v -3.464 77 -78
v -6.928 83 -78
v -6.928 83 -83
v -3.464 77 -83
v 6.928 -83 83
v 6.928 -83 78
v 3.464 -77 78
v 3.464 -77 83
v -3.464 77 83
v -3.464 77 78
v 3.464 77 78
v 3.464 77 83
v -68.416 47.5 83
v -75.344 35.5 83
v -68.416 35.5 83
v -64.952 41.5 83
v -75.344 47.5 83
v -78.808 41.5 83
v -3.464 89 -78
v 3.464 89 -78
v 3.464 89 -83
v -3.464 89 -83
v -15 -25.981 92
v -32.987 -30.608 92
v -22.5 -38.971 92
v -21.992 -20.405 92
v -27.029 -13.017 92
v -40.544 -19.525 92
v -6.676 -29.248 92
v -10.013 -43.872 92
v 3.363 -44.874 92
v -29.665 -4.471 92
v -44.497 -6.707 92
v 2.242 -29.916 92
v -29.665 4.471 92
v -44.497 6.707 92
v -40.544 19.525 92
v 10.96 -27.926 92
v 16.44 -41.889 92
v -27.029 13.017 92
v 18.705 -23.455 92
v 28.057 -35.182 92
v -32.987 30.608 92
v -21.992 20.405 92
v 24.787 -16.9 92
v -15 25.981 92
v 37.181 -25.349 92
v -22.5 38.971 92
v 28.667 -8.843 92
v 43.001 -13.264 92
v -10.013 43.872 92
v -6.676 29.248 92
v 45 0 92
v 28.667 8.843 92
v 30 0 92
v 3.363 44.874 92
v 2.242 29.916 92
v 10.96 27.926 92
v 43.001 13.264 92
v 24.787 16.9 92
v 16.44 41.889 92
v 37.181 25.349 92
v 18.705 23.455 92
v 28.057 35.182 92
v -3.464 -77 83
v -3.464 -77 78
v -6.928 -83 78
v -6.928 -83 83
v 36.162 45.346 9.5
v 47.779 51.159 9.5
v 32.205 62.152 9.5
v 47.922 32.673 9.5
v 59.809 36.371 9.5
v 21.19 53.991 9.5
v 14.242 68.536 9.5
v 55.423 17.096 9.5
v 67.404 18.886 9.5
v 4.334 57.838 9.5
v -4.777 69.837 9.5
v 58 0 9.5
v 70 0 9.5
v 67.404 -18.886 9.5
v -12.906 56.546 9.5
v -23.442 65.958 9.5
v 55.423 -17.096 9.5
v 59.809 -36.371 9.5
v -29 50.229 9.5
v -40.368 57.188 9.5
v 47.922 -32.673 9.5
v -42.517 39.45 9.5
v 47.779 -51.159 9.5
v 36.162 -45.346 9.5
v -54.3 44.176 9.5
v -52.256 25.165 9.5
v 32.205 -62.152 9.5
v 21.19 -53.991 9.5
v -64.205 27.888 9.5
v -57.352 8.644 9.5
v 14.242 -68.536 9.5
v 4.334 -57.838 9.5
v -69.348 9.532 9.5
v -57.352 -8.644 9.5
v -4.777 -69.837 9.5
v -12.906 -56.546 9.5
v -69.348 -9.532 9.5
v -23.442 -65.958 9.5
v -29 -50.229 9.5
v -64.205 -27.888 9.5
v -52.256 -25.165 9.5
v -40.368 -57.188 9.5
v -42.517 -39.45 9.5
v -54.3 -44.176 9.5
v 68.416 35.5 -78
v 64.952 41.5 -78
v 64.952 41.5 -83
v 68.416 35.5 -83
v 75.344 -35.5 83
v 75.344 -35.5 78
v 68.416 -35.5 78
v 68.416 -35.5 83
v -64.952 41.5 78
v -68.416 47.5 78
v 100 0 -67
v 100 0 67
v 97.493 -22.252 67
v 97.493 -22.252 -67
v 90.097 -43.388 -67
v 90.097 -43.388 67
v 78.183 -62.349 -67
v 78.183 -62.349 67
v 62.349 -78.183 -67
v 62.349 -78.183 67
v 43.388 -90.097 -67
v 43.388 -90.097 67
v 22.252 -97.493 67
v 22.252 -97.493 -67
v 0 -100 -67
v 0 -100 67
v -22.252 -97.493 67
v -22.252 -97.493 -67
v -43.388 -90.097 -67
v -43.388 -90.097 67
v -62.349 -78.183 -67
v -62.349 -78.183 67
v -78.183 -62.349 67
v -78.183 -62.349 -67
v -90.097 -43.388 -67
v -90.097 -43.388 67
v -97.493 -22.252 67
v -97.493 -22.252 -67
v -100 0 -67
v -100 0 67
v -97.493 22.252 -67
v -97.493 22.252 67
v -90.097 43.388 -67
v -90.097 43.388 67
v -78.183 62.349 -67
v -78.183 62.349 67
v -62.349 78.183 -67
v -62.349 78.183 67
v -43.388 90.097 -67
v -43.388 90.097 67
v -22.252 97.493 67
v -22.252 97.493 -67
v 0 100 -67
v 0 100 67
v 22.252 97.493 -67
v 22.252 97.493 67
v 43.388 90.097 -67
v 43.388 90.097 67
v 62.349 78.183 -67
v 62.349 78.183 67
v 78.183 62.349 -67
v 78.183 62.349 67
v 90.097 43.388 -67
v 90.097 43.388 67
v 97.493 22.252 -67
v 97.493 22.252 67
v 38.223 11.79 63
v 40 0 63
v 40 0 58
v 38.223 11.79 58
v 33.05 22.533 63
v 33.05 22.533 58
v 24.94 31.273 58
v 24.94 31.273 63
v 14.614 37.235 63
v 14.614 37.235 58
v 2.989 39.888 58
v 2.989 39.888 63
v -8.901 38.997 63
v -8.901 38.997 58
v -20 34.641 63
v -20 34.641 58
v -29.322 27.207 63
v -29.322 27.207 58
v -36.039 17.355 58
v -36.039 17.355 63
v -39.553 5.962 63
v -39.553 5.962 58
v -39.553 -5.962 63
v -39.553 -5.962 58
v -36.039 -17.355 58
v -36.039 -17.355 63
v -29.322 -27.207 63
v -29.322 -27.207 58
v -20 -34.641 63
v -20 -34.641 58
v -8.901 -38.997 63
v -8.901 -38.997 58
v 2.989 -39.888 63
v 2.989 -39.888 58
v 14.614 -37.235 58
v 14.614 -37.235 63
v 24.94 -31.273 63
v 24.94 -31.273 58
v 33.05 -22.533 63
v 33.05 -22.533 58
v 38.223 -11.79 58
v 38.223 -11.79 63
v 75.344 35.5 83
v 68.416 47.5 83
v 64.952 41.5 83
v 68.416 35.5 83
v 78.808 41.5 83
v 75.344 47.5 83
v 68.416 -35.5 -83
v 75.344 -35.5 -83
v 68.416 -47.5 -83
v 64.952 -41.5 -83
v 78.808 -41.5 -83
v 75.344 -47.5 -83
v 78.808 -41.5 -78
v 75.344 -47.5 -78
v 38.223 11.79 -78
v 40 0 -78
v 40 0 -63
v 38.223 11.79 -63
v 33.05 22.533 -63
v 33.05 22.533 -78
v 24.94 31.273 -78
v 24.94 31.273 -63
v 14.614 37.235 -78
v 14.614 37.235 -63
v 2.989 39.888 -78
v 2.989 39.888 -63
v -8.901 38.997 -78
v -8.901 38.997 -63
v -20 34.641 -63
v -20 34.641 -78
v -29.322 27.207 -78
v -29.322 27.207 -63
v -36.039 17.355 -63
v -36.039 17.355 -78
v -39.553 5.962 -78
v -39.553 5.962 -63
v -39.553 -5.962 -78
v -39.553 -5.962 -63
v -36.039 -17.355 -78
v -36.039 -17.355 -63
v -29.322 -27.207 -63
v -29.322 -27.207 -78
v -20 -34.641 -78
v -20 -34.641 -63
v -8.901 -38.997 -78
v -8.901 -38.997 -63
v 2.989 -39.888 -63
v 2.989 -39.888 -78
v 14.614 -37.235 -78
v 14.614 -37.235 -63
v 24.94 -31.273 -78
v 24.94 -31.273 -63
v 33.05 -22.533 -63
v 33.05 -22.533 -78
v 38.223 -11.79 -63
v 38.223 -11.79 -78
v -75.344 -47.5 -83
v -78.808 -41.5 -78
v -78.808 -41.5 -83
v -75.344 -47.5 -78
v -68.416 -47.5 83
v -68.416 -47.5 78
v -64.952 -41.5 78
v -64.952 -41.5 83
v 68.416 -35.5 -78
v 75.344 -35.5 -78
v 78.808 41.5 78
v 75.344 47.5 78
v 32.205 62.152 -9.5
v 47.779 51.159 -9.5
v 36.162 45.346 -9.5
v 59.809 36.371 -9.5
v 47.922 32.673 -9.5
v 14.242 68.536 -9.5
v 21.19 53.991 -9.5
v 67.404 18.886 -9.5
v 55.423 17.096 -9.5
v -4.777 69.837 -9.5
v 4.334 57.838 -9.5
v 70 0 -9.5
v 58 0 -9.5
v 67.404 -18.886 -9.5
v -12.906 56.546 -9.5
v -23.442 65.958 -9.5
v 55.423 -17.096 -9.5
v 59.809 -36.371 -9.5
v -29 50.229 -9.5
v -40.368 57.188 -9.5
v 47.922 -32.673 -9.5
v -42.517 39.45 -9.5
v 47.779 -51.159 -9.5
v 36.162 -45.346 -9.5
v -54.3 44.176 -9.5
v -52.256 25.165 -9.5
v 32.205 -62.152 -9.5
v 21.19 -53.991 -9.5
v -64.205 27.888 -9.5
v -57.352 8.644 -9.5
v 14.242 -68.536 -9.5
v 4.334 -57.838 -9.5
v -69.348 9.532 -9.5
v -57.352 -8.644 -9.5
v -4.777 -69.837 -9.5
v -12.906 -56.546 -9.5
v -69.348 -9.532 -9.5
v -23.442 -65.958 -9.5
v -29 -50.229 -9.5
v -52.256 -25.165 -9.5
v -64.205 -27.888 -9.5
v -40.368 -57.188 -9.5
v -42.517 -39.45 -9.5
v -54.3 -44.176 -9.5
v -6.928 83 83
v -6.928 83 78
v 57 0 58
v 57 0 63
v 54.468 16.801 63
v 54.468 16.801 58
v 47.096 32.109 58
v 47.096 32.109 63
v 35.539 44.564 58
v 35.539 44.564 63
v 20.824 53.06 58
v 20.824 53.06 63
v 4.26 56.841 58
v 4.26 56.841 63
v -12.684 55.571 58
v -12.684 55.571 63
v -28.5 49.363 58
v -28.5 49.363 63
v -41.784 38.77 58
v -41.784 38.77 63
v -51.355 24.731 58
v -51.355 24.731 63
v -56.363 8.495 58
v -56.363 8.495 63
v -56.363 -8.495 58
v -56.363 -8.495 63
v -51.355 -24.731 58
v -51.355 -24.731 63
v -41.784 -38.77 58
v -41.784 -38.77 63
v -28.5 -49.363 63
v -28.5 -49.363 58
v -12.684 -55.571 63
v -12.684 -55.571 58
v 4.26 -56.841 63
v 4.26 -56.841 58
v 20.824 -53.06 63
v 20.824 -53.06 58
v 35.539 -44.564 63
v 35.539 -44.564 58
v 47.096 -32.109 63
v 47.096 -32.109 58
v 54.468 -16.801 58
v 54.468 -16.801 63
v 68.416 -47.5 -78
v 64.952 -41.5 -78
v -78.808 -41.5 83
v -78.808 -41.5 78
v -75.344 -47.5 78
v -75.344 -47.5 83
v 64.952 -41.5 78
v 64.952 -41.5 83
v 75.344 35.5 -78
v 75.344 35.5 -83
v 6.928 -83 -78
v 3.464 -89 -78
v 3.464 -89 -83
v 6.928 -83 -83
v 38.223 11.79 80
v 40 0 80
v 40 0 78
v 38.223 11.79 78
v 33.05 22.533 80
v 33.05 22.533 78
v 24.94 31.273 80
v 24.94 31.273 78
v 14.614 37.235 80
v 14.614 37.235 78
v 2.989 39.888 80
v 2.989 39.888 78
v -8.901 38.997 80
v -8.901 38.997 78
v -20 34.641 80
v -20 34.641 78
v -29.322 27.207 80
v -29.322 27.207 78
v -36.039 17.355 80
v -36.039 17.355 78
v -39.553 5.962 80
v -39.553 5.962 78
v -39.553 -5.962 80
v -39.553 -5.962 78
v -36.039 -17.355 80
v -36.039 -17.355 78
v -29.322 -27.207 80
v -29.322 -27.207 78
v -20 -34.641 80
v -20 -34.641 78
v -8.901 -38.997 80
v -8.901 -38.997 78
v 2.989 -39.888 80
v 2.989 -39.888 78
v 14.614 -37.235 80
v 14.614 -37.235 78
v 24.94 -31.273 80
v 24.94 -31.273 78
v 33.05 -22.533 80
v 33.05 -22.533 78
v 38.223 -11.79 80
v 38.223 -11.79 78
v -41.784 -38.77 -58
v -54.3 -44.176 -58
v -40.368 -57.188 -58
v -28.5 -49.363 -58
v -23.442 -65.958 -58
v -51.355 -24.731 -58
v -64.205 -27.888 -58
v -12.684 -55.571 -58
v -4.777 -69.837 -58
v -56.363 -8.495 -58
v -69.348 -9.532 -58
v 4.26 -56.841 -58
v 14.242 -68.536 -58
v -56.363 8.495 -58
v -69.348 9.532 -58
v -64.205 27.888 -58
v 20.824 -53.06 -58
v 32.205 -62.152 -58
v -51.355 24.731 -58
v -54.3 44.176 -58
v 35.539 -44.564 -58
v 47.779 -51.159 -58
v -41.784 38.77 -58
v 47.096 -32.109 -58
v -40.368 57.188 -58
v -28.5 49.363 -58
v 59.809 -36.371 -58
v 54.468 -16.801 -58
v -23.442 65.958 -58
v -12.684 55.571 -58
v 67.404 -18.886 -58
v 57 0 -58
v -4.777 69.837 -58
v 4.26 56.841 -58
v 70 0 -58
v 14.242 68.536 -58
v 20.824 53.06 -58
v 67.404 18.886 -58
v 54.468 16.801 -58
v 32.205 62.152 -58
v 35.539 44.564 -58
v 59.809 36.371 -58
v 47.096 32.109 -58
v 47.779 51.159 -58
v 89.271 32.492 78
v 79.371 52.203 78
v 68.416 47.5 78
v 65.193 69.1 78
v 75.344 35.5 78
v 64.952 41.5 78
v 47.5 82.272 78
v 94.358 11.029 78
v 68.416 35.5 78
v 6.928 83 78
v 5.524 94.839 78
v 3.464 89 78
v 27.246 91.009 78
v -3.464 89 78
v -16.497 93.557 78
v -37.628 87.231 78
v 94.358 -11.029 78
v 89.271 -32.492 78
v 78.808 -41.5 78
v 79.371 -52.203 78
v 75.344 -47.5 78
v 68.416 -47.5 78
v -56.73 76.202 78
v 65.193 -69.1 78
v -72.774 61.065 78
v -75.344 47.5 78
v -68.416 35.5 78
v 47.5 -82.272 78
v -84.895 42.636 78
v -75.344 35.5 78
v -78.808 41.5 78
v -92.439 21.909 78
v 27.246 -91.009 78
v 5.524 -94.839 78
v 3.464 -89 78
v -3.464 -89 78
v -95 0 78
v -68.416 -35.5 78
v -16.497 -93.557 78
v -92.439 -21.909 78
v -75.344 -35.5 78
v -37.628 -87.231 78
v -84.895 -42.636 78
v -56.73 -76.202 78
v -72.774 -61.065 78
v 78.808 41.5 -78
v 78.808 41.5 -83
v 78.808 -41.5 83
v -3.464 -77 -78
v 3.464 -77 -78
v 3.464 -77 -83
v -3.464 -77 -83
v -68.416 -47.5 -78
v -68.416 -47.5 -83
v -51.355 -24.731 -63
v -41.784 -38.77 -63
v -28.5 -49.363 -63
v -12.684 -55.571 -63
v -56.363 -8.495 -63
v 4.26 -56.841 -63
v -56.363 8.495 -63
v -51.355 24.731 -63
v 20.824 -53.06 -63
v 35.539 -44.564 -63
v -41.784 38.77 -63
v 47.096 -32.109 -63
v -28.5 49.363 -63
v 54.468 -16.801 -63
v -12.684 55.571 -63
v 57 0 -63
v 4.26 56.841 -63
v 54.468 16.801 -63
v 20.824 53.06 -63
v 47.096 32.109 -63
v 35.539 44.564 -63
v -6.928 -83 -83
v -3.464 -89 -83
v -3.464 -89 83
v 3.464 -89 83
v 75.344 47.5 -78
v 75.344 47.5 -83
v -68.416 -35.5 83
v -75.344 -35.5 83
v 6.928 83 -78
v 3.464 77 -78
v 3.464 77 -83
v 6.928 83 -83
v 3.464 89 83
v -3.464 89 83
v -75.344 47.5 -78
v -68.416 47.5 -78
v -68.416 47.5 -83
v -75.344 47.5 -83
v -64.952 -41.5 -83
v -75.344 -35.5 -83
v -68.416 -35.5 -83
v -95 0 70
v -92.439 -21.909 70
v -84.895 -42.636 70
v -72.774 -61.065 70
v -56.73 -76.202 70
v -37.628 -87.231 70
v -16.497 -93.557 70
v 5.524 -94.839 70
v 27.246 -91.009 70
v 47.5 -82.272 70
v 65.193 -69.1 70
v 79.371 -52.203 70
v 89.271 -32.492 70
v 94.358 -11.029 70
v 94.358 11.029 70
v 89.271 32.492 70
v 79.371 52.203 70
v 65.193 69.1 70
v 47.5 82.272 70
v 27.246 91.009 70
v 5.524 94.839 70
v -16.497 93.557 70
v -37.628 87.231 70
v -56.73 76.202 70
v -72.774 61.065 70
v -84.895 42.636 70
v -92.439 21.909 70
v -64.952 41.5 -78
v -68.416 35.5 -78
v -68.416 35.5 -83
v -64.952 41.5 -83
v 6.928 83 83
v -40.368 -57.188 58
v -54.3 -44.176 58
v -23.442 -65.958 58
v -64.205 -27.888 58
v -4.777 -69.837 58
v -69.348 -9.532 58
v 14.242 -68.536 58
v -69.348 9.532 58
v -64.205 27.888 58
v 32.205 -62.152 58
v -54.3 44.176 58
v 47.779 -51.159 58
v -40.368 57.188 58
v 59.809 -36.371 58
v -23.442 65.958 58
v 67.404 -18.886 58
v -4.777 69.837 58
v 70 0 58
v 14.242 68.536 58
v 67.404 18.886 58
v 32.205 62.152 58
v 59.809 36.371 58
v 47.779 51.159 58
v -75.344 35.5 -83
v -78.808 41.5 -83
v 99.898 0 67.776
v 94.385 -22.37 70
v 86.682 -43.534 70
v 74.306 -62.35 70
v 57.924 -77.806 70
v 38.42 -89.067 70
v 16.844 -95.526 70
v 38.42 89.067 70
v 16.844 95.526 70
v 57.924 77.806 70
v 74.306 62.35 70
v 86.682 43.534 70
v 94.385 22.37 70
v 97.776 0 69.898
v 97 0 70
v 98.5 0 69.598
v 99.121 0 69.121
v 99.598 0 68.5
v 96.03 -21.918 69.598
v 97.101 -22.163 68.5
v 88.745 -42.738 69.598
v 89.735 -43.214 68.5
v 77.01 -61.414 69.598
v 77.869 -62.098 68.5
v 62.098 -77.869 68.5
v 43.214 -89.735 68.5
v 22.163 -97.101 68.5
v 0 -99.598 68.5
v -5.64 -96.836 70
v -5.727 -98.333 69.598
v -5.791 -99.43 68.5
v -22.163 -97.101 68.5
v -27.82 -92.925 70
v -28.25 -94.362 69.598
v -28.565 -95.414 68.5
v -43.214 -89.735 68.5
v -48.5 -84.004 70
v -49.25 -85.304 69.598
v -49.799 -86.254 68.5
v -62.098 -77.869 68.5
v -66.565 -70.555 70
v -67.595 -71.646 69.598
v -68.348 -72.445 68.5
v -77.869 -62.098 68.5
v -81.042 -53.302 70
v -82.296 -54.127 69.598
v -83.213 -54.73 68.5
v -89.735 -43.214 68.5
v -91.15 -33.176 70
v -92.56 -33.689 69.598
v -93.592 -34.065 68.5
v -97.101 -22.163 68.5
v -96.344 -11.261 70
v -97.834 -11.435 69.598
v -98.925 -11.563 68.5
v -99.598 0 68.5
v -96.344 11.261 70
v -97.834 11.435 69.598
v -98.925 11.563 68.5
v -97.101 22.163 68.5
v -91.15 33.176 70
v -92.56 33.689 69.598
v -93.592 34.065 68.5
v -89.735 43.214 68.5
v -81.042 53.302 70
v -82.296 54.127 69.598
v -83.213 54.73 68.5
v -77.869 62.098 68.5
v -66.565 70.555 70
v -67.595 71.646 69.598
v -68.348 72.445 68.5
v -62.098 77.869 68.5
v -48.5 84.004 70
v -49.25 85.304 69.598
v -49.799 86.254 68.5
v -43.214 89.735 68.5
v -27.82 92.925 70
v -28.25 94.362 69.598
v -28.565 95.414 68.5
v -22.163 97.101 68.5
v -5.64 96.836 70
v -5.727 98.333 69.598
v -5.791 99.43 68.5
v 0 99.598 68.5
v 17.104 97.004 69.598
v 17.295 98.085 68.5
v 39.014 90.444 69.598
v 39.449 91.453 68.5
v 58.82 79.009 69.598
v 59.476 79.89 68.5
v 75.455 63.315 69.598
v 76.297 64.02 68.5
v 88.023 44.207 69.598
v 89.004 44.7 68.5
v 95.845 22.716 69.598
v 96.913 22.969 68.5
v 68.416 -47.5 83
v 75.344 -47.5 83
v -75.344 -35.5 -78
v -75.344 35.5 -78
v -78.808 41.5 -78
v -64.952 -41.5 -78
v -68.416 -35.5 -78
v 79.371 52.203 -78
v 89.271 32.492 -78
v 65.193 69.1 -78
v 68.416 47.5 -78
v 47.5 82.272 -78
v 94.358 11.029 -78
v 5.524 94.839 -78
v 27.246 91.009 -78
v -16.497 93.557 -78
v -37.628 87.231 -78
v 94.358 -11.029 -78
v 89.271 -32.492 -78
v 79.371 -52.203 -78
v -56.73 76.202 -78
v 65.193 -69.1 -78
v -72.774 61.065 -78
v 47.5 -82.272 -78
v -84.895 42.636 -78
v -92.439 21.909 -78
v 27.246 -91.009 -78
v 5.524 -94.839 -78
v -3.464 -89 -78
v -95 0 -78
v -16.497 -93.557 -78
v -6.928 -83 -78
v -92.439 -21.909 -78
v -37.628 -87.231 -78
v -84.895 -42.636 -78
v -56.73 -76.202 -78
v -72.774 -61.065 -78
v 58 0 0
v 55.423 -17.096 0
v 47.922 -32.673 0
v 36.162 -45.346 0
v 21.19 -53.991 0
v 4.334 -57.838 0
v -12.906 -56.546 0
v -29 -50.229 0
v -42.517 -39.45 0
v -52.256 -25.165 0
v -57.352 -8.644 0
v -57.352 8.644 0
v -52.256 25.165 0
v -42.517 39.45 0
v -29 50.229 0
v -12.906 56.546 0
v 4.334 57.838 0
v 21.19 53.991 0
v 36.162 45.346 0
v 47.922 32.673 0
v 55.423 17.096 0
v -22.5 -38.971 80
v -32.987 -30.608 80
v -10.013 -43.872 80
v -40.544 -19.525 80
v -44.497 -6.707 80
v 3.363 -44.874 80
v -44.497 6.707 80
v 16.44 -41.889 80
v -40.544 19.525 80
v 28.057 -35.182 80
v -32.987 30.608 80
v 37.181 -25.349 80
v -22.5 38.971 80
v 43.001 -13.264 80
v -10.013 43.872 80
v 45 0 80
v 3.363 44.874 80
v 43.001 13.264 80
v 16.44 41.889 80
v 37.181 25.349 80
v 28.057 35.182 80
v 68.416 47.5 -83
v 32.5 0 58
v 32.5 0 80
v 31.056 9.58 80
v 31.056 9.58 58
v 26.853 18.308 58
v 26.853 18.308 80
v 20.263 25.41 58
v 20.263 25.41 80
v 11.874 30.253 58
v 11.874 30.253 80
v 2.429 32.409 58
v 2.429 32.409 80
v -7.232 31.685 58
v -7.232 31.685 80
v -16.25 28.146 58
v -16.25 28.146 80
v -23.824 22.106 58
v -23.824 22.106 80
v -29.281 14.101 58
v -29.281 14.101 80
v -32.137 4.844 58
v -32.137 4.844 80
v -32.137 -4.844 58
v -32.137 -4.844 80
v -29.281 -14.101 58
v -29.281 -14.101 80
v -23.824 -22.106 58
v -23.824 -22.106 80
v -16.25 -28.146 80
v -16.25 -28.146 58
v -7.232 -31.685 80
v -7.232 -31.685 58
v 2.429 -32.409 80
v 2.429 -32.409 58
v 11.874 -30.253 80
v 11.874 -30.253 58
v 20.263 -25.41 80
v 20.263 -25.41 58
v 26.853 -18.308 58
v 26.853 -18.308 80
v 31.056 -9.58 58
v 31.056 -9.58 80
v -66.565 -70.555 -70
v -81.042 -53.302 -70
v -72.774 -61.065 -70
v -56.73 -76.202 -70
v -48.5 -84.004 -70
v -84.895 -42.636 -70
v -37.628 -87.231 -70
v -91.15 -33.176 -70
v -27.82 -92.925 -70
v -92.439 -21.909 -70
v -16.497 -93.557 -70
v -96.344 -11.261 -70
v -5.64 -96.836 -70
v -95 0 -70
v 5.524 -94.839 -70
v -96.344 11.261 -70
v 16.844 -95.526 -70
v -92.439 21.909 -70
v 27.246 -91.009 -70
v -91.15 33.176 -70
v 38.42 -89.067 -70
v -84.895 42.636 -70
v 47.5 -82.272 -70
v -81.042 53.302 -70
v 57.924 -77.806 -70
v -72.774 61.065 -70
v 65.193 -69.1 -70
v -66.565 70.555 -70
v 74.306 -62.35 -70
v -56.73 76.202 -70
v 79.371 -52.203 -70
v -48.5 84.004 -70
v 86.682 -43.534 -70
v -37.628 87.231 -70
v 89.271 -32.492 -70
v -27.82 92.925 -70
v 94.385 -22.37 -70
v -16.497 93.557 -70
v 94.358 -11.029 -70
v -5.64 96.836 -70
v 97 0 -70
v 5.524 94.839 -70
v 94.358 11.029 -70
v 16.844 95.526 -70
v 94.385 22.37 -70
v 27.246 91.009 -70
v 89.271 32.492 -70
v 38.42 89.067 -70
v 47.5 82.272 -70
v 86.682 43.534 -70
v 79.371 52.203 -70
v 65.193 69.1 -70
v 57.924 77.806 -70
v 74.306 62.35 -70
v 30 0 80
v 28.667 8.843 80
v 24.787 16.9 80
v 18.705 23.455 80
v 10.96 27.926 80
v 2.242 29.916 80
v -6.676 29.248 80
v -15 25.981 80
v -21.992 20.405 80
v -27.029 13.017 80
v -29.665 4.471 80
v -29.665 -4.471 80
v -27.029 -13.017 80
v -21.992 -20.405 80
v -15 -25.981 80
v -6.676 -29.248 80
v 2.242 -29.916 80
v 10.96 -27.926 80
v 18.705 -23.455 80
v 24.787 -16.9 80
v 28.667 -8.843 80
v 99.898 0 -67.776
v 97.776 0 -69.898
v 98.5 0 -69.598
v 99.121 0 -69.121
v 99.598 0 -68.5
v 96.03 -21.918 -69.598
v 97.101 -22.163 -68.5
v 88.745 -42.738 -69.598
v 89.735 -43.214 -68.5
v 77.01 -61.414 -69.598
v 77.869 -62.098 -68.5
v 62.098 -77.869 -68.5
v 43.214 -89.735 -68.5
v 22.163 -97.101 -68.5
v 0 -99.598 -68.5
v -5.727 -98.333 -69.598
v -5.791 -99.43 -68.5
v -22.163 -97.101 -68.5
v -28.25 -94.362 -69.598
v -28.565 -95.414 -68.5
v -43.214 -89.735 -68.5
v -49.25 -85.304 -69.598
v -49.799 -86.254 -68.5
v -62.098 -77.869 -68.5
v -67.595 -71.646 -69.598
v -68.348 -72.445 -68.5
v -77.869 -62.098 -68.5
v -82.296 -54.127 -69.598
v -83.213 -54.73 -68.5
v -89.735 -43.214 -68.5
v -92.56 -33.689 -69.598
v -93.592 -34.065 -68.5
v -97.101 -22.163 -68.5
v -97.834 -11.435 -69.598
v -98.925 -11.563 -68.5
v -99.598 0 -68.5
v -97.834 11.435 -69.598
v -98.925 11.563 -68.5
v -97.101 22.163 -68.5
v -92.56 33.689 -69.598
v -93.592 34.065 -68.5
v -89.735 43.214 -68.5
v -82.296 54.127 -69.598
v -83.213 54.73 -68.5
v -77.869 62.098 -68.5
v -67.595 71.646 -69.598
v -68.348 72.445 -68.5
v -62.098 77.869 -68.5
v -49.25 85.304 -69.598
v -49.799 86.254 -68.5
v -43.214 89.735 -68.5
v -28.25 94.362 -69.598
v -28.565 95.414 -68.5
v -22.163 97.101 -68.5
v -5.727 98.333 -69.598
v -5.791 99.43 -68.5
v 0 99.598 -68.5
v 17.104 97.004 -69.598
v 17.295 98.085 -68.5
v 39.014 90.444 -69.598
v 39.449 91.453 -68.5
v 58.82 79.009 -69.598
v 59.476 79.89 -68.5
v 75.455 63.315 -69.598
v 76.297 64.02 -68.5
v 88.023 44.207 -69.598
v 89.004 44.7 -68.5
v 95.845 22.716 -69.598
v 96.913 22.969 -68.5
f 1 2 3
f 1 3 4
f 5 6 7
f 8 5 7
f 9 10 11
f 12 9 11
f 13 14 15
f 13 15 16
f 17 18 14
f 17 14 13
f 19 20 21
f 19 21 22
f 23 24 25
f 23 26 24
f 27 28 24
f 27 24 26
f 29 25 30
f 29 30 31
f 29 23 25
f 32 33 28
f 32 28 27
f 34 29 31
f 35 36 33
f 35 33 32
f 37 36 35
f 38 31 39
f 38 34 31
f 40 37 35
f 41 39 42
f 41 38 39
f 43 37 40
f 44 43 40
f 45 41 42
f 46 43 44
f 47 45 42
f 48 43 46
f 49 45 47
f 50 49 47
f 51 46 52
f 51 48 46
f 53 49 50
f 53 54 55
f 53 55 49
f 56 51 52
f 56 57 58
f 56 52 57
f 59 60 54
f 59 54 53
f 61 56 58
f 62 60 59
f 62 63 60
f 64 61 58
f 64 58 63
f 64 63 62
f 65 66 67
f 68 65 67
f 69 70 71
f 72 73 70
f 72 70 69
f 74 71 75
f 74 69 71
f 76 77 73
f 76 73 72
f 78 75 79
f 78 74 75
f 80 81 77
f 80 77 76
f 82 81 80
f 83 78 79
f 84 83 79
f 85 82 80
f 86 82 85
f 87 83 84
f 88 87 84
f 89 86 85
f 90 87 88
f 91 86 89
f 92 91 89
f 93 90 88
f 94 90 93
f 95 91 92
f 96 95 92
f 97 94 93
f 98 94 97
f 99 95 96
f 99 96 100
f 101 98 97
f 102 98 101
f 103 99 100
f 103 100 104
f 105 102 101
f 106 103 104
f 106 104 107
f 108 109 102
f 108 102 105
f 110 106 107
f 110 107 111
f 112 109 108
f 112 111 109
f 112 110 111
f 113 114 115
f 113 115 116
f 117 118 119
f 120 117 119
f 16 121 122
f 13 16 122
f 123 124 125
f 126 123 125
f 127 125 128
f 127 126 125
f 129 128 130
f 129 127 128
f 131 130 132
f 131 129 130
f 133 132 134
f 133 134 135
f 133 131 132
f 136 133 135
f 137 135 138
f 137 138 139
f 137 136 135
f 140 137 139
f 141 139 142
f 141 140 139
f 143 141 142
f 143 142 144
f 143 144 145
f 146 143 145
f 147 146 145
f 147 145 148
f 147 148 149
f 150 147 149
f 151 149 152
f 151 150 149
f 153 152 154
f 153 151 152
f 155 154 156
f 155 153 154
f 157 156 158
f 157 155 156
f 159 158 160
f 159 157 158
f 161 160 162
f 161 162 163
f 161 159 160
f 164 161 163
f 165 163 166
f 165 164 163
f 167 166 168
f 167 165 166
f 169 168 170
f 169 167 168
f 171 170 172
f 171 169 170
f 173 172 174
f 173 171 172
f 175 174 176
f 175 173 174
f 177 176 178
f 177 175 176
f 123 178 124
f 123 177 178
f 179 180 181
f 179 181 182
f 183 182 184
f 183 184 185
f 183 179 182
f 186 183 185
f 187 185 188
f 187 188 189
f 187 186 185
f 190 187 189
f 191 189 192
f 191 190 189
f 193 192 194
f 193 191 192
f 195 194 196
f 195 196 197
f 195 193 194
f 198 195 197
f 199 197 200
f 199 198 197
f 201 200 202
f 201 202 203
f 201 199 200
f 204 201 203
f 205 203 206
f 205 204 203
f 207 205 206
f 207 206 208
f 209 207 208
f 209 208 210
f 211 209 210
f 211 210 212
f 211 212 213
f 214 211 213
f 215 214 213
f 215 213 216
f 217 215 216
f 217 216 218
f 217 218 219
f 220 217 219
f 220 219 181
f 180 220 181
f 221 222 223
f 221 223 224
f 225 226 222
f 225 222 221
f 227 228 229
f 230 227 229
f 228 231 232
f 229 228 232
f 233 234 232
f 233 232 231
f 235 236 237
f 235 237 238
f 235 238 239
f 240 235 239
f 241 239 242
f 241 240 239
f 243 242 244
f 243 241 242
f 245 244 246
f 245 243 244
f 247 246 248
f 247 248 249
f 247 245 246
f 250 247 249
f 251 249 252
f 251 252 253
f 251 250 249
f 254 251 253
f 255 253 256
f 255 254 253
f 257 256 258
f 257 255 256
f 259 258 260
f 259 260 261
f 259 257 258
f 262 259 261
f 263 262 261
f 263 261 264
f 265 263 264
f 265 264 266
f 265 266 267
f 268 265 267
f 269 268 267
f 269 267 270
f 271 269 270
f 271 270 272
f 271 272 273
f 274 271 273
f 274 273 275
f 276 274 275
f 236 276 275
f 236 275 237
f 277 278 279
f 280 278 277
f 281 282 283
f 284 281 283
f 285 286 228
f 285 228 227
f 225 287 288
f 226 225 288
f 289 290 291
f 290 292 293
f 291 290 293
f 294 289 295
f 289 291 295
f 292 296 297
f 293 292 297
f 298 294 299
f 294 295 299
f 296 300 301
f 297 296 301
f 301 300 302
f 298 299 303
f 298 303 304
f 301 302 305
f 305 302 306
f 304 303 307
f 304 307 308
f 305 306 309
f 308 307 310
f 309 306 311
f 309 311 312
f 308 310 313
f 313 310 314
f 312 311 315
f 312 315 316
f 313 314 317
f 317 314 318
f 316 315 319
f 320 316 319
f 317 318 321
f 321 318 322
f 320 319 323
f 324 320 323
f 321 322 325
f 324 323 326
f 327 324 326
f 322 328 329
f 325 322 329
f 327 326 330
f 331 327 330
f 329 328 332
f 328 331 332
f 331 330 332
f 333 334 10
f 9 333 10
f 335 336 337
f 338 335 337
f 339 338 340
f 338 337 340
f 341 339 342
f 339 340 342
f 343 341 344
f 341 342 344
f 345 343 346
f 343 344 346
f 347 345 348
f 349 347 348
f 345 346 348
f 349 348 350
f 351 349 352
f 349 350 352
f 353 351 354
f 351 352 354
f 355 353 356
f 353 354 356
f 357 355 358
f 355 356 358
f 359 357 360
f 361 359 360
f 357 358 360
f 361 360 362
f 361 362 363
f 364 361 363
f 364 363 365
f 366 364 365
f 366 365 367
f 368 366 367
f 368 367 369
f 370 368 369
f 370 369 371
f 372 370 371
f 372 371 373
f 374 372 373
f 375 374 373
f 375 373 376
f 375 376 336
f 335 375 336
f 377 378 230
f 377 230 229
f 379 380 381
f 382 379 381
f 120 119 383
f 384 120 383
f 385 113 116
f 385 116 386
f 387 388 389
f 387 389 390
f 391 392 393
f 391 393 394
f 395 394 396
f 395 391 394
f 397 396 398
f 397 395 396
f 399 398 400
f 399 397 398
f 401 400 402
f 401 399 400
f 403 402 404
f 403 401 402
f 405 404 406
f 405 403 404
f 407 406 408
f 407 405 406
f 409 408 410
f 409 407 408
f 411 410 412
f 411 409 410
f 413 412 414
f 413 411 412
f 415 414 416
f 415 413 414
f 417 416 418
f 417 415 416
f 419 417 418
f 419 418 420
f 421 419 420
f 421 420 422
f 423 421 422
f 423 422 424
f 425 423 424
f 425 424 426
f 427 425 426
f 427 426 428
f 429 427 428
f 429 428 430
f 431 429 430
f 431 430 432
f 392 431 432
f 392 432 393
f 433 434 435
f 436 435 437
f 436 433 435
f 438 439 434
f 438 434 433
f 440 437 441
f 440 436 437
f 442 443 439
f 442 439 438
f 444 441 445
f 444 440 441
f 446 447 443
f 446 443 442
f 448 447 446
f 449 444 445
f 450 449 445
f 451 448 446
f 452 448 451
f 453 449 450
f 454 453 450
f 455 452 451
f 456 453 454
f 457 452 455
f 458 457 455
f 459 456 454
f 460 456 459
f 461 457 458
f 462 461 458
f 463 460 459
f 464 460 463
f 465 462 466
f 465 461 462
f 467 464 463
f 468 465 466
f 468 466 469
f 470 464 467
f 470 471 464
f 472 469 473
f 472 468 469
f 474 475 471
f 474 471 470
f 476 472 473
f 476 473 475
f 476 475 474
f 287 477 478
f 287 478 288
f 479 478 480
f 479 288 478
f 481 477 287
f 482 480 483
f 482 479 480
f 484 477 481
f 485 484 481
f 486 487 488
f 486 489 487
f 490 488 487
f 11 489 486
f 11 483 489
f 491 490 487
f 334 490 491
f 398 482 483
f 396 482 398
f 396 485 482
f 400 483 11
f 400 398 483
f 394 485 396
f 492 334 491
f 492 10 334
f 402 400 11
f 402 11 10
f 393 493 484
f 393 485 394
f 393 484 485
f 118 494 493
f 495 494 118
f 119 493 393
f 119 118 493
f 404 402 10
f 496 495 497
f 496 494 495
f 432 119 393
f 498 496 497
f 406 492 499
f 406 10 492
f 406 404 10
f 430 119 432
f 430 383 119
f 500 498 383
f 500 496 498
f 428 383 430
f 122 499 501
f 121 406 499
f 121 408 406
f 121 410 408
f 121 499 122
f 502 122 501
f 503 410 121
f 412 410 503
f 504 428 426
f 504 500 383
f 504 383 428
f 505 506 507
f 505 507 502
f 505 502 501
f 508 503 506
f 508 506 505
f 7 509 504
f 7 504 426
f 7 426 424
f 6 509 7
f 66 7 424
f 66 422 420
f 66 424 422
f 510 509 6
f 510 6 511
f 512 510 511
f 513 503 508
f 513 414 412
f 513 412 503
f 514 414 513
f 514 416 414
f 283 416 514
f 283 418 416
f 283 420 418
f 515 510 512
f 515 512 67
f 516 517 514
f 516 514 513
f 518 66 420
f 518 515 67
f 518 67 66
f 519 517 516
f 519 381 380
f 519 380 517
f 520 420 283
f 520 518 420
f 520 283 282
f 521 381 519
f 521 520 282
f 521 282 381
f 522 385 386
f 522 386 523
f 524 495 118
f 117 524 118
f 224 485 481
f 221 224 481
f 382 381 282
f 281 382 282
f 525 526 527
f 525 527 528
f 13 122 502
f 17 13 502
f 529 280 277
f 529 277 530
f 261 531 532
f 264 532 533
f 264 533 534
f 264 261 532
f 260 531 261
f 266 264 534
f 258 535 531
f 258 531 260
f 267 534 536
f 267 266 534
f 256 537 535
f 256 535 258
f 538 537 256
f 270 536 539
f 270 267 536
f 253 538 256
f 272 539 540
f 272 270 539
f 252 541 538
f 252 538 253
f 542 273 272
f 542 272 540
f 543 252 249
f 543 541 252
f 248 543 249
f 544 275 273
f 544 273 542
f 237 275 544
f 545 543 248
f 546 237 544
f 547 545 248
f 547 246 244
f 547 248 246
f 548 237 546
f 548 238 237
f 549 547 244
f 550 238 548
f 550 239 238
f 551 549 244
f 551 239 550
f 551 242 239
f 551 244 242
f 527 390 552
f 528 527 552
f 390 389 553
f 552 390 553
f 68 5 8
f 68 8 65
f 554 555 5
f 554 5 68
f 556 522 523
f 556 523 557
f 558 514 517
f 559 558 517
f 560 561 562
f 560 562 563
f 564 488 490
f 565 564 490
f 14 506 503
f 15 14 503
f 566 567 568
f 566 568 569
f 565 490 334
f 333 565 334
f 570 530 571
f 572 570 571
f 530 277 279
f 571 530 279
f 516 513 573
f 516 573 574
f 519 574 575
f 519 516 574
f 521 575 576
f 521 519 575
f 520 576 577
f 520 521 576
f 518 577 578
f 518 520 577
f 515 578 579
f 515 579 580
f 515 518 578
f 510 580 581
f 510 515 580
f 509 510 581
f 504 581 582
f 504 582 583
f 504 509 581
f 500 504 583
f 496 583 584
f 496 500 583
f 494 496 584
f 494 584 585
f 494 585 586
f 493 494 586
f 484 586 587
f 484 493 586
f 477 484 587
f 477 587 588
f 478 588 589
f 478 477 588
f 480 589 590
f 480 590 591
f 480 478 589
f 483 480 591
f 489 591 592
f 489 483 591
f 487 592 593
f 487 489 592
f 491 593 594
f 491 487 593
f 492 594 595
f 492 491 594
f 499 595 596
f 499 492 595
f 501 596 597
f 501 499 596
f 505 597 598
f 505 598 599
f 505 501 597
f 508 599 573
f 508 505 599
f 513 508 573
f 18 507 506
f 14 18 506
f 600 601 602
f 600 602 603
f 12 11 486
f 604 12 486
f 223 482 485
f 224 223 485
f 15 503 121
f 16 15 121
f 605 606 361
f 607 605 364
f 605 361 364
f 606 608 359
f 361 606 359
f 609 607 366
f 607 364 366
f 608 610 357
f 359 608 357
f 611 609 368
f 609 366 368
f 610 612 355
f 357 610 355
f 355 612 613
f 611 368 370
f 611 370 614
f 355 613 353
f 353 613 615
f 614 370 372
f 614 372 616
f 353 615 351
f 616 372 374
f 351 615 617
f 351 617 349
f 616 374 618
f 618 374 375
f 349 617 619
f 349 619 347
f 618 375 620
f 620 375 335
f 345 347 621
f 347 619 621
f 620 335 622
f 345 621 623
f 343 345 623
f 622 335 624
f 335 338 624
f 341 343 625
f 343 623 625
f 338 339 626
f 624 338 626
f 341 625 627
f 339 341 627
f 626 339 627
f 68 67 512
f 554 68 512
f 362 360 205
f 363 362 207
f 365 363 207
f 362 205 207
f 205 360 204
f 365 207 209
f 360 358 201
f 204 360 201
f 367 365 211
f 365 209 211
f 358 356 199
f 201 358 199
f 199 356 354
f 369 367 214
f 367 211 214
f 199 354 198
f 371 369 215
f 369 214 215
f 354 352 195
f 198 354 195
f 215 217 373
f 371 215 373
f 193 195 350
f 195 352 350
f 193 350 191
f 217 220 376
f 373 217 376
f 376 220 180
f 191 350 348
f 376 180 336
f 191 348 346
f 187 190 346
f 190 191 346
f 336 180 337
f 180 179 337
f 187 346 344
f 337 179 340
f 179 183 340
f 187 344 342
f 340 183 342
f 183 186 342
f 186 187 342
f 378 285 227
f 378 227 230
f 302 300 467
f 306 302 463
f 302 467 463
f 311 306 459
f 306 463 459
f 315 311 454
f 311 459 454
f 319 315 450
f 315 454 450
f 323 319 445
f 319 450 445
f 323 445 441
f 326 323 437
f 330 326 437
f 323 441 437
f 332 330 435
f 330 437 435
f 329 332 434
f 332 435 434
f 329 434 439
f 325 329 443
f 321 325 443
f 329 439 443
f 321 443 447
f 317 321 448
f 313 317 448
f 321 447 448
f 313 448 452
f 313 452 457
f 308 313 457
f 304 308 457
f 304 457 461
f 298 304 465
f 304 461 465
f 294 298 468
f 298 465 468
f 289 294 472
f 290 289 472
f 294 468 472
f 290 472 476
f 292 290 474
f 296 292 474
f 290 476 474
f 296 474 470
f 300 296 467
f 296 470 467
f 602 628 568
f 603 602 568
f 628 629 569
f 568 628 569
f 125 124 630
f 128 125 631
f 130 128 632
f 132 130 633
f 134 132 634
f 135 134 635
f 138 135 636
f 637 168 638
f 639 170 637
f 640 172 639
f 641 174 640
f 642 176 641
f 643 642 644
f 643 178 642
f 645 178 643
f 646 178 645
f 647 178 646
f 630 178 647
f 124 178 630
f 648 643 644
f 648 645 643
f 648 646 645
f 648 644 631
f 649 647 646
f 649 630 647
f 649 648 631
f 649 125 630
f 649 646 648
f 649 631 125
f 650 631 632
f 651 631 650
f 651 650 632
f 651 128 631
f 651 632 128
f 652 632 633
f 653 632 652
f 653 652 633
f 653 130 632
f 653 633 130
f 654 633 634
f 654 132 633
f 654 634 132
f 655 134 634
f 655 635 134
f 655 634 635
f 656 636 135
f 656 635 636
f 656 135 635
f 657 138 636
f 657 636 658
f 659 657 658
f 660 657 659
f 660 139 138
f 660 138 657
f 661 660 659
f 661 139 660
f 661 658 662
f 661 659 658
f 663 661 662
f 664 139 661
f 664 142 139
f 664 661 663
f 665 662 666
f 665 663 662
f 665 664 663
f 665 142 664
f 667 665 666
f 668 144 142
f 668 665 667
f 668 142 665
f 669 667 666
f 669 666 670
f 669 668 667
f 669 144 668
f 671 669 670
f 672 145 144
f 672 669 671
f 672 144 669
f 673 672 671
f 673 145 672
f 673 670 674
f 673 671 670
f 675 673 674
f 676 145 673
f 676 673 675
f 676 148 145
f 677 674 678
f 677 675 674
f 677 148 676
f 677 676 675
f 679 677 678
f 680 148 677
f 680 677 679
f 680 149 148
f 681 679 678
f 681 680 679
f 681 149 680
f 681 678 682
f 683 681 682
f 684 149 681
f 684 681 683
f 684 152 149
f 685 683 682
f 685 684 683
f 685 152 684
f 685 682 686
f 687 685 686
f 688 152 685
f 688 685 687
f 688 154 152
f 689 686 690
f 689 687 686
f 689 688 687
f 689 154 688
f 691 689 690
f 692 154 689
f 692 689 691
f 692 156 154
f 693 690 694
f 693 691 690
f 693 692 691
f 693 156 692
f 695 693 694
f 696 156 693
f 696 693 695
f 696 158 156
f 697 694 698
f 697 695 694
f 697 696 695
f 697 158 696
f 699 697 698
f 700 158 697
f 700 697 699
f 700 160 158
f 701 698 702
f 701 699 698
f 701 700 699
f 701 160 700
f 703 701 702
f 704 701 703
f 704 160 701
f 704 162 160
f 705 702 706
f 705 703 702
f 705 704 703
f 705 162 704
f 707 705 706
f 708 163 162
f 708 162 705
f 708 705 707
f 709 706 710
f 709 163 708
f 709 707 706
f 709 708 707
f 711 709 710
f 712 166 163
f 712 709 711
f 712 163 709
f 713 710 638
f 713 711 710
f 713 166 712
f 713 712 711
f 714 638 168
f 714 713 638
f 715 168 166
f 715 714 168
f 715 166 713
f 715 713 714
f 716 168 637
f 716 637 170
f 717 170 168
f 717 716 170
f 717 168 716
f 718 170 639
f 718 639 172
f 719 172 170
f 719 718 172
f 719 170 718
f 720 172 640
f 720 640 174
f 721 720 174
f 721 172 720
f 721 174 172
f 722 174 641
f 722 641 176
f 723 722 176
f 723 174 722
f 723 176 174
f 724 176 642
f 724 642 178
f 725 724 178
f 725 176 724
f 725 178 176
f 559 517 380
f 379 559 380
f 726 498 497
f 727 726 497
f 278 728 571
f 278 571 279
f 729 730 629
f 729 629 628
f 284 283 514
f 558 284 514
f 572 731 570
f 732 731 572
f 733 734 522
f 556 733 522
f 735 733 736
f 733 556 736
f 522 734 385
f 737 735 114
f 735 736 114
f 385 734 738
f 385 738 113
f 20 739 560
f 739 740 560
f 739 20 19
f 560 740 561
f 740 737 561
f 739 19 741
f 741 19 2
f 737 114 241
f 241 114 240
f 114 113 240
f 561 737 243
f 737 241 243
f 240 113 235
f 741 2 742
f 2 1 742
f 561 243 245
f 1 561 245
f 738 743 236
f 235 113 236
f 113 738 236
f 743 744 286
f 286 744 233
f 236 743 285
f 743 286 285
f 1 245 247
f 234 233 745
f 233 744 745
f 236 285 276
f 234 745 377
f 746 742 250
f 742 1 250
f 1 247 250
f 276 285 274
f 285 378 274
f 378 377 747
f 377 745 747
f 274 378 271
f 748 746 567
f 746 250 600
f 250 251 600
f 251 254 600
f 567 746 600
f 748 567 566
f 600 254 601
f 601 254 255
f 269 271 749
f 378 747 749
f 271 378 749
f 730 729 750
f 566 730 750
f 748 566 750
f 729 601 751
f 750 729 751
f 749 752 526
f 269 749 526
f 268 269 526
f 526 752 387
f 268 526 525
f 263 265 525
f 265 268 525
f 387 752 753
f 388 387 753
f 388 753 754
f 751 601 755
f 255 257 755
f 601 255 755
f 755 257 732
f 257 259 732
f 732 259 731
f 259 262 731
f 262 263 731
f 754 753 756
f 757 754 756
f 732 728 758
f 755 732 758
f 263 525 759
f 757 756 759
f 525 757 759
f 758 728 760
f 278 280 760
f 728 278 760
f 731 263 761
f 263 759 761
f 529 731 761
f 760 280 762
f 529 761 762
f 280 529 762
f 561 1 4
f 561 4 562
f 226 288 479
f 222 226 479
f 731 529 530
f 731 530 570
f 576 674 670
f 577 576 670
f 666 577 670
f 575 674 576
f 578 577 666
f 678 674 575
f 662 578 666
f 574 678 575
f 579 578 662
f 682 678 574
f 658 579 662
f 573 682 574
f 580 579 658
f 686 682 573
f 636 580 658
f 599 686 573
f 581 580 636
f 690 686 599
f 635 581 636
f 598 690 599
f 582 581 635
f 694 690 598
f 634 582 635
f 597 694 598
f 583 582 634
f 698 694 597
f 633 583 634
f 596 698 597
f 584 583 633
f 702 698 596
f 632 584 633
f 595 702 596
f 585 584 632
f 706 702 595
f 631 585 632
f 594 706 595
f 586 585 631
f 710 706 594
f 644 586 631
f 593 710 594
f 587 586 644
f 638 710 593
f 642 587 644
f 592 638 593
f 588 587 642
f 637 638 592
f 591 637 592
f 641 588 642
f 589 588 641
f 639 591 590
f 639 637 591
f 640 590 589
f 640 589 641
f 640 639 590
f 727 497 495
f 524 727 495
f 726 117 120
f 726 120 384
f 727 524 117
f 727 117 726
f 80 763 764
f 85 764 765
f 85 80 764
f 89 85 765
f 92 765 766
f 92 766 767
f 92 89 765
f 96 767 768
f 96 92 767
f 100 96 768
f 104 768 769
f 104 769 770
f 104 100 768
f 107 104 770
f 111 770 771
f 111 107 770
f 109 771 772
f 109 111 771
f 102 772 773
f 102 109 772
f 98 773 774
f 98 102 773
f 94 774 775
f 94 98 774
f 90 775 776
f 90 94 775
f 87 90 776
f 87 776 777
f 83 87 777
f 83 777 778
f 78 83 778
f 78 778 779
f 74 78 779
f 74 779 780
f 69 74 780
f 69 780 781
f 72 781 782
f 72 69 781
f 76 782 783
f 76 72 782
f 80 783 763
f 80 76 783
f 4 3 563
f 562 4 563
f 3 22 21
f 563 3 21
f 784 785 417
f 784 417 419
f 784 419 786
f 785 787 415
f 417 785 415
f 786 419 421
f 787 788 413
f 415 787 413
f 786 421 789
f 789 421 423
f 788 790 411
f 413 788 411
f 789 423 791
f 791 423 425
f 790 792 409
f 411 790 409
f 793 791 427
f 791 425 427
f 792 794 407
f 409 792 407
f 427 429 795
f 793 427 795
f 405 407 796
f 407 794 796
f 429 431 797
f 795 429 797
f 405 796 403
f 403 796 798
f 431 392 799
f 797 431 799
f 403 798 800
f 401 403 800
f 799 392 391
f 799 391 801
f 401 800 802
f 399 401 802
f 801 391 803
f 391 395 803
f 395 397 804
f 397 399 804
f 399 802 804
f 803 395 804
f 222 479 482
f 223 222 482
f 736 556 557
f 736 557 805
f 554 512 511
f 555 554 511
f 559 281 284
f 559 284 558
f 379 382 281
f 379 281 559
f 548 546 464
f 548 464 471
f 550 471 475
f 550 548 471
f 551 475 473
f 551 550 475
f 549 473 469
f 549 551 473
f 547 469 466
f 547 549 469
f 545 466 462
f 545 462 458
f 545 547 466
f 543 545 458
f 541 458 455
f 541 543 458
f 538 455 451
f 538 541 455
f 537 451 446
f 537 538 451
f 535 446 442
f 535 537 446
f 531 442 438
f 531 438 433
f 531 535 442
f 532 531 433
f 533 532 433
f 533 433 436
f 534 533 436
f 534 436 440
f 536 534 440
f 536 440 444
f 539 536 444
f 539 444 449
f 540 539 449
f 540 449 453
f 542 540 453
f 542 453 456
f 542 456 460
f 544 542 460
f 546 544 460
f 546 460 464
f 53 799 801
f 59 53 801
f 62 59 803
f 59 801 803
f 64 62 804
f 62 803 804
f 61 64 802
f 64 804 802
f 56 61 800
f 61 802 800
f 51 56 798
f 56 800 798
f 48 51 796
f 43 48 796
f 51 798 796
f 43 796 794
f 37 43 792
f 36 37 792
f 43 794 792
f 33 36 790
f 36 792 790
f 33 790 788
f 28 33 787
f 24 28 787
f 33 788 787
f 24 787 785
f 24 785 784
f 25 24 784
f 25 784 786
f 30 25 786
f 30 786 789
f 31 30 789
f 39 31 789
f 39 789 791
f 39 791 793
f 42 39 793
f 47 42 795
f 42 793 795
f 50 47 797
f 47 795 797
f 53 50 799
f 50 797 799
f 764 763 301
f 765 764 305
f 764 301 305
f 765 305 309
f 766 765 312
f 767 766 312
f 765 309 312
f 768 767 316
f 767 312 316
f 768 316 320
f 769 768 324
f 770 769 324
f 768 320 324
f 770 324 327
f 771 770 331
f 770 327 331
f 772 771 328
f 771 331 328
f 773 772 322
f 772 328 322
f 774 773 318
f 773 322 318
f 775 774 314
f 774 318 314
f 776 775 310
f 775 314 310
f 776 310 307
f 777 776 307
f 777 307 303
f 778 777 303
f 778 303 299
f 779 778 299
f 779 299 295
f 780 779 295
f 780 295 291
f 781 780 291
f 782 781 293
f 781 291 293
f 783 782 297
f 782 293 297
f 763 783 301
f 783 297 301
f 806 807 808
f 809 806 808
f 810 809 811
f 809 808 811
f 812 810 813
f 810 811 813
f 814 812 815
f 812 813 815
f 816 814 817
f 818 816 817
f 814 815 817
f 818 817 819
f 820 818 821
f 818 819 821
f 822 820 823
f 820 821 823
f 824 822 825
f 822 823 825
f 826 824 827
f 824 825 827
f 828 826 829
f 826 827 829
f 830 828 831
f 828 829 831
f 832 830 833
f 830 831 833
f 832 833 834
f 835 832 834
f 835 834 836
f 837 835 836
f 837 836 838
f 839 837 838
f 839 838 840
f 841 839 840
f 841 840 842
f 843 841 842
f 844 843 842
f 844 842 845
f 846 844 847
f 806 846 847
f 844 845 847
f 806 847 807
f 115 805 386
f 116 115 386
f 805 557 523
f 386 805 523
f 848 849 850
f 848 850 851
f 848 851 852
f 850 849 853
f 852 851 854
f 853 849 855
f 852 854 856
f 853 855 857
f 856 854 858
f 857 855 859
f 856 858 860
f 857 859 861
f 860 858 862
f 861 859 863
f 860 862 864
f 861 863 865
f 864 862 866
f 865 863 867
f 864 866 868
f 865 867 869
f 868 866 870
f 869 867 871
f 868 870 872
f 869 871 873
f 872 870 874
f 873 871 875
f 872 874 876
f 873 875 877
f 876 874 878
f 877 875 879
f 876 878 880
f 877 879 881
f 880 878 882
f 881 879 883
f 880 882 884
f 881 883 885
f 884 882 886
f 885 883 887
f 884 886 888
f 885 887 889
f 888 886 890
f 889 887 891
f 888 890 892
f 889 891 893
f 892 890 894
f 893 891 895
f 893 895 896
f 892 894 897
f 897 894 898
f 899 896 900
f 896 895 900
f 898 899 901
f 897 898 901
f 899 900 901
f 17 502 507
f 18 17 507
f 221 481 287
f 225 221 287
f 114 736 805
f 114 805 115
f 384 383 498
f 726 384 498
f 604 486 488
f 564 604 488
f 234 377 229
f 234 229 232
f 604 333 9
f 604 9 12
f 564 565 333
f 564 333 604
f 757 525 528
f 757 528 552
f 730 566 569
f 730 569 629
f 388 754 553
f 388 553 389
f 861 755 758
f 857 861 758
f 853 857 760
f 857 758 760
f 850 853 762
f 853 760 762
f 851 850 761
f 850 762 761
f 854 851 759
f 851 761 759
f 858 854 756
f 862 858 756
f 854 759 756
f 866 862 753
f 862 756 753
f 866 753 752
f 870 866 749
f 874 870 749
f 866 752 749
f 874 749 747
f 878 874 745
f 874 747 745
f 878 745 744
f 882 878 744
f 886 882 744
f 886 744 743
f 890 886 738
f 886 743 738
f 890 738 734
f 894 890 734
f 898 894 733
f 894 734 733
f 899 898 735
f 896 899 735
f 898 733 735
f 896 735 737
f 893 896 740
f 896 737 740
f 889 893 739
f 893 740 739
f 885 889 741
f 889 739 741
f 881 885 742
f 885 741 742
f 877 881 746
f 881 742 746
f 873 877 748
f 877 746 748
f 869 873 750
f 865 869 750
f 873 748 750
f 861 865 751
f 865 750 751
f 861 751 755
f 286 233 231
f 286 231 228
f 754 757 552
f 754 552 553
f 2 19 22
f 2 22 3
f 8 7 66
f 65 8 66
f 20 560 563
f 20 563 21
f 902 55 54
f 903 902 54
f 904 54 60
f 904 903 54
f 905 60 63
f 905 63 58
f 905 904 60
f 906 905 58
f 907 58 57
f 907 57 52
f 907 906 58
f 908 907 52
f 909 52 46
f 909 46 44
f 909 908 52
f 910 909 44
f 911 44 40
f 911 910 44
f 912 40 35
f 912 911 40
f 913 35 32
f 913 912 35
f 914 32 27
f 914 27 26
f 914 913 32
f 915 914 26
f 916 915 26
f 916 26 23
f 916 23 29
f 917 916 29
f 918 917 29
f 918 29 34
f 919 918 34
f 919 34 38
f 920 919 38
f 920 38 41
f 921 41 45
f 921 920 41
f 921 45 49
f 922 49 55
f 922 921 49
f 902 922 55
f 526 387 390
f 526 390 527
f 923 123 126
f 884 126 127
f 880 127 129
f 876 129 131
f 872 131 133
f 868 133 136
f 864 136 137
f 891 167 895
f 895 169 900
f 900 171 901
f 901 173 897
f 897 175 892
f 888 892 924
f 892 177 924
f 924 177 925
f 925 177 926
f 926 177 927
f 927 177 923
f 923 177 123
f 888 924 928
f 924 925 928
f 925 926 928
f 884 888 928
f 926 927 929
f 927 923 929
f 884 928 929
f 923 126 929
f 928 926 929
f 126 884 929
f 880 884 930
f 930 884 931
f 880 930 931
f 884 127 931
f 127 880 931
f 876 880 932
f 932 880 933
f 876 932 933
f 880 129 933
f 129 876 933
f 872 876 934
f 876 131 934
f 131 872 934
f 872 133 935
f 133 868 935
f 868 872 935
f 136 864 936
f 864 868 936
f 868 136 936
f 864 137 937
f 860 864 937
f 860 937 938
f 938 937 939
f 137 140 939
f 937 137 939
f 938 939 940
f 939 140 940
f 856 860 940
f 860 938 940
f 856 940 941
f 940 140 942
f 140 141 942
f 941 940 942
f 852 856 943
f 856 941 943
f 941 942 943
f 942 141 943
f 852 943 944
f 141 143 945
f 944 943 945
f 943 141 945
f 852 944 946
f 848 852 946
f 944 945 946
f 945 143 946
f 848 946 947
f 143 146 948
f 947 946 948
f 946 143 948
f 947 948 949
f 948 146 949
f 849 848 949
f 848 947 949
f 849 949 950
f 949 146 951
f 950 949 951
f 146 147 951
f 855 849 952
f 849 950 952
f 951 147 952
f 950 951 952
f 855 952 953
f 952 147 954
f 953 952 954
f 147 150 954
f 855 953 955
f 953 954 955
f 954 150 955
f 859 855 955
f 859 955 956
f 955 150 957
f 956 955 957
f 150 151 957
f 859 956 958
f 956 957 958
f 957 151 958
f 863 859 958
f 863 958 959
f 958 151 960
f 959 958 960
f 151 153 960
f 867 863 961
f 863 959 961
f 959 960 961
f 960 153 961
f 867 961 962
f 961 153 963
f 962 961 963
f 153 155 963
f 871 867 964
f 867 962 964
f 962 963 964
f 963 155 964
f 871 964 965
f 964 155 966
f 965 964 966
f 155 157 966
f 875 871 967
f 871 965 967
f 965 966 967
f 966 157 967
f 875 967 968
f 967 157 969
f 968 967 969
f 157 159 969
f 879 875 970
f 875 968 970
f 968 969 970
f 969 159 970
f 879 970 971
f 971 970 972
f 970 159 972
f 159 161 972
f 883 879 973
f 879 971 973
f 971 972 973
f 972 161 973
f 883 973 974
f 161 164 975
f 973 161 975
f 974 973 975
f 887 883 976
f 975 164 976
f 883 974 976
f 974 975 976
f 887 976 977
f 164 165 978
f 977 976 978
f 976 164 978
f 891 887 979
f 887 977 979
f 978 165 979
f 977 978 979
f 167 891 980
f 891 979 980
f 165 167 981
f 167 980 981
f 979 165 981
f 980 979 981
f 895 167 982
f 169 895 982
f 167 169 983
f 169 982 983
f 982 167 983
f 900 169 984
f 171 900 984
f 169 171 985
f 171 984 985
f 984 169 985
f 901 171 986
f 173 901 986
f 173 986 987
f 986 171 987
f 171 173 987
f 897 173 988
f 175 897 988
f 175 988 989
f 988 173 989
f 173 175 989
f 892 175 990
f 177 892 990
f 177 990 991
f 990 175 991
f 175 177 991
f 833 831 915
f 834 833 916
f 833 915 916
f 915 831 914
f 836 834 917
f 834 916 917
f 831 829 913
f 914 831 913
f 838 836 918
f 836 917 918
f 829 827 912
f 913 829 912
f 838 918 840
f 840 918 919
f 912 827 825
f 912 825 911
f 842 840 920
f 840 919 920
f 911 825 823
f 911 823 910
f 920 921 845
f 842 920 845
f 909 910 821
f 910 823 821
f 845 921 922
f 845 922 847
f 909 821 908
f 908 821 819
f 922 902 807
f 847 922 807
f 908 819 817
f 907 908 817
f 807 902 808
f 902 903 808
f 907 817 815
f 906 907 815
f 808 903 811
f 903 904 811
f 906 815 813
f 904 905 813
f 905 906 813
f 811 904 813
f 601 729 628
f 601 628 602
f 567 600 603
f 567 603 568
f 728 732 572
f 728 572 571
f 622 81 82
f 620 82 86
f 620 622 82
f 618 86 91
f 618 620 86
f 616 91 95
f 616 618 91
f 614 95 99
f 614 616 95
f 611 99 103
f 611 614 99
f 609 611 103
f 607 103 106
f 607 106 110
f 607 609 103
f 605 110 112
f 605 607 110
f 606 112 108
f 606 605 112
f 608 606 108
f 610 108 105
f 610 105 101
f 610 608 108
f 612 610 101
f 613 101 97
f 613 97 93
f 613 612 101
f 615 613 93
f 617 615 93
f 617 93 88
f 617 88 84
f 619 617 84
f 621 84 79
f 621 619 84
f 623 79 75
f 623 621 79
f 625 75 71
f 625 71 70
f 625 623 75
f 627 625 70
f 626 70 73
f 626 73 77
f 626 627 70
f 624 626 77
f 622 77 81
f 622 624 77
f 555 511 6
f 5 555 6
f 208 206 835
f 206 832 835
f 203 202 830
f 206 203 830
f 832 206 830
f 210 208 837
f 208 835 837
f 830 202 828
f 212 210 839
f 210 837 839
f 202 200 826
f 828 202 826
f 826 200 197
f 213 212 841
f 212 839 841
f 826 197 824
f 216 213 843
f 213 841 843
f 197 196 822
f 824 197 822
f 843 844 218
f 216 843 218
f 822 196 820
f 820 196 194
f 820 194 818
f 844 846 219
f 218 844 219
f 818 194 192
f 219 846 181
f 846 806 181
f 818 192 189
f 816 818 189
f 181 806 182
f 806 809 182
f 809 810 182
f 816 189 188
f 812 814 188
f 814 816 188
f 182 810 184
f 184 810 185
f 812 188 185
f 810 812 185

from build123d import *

# Parameters (mm, degrees)
SKETCH_2_R               = 70
SKETCH_2_R_2             = 57
EXTRUDE_1_DEPTH          = 12
SKETCH_3_R               = 57
SKETCH_3_R_2             = 40
EXTRUDE_2_DEPTH          = 7
EXTRUDE_START            = 8
SKETCH_4_R               = 95
SKETCH_4_R_2             = 40
EXTRUDE_3_DEPTH          = 8
EXTRUDE_4_DEPTH          = 5
PATTERN_CIRCULAR_2_COUNT = 6
FILLET_1_R               = 3
SKETCH_6_R               = 40
SKETCH_6_R_2             = 32.5
EXTRUDE_5_DEPTH          = 22
SKETCH_7_R               = 45
SKETCH_7_R_2             = 30
EXTRUDE_6_DEPTH          = 12


with BuildPart() as part:
    # 草图1 → 旋转2 (revolve)
    with BuildSketch(Plane(origin=(0, 0, 0), x_dir=(0, 0, -1), z_dir=(1, 0, 0)), mode=Mode.PRIVATE) as revolve_2_sk:
        Polygon((-70, 100), (0, 100), (0, 58), (-9.5, 58), (-9.5, 70), (-70, 70), align=None)
    revolve(revolve_2_sk.sketch.rotate(Axis((0, 0, 1000), (0, 0, -1)), 90), axis=Axis((0, 0, 1000), (0, 0, -1)))



with BuildPart() as body_2:
    # 草图2 → 凸台-拉伸1 (new body)
    with BuildSketch(Plane.XY.offset(70)):
        Circle(SKETCH_2_R)
        Circle(SKETCH_2_R_2, mode=Mode.SUBTRACT)
    extrude(amount=-EXTRUDE_1_DEPTH)


with BuildPart() as part_1:
    add(part.part)

    add(body_2.part)  # 凸台-拉伸2 merges body 2
    # 草图3 → 凸台-拉伸2 (add)
    with BuildSketch(Plane.XY.offset(70)):
        Circle(SKETCH_3_R)
        Circle(SKETCH_3_R_2, mode=Mode.SUBTRACT)
    extrude(amount=-EXTRUDE_2_DEPTH)

    # 草图4 → 凸台-拉伸3 (add)
    with BuildSketch(Plane.XY.offset(70).offset(EXTRUDE_START)):
        with Locations(Location((0, 0, 0), (0, 0, 180))):
            Circle(SKETCH_4_R)
        Circle(SKETCH_4_R_2, mode=Mode.SUBTRACT)
    extrude(amount=-EXTRUDE_3_DEPTH)

    # 草图5 → 凸台-拉伸4 (add)
    with BuildSketch(Plane.XY.offset(78)):
        Polygon((3.464101615, 77), (6.92820323, 83), (3.464101615, 89), (-3.464101615, 89), (-6.92820323, 83), (-3.464101615, 77), align=None)
    extrude_4 = extrude(amount=EXTRUDE_4_DEPTH)

    # 阵列(圆周)2: 凸台-拉伸4 ×6 about axis
    pattern_circular_2_axis = Axis((0, 0, 0), (0, 0, 1))
    for i in range(1, PATTERN_CIRCULAR_2_COUNT):
        add(extrude_4.rotate(pattern_circular_2_axis, i * 360 / PATTERN_CIRCULAR_2_COUNT))

    # 圆角1
    fillet_1_edges = [part_1.edges().sort_by_distance(p)[0] for p in [
        (-100, 0, 70),
    ]]
    fillet(fillet_1_edges, radius=FILLET_1_R)

    # 镜向8: part across plane


with BuildPart() as part_2:
    add(part_1.part)
    add(part_1.part.mirror(Plane(origin=(0, 100, 0), x_dir=(1, 0, 0), z_dir=(0, 0, 1))))

    # 草图6 → 凸台-拉伸5 (add)
    with BuildSketch(Plane.XY.offset(80)):
        Circle(SKETCH_6_R)
        Circle(SKETCH_6_R_2, mode=Mode.SUBTRACT)
    extrude(amount=-EXTRUDE_5_DEPTH)

    # 草图7 → 凸台-拉伸6 (add)
    with BuildSketch(Plane.XY.offset(80)):
        Circle(SKETCH_7_R)
        Circle(SKETCH_7_R_2, mode=Mode.SUBTRACT)
    extrude(amount=EXTRUDE_6_DEPTH)


solid = part_2.part
